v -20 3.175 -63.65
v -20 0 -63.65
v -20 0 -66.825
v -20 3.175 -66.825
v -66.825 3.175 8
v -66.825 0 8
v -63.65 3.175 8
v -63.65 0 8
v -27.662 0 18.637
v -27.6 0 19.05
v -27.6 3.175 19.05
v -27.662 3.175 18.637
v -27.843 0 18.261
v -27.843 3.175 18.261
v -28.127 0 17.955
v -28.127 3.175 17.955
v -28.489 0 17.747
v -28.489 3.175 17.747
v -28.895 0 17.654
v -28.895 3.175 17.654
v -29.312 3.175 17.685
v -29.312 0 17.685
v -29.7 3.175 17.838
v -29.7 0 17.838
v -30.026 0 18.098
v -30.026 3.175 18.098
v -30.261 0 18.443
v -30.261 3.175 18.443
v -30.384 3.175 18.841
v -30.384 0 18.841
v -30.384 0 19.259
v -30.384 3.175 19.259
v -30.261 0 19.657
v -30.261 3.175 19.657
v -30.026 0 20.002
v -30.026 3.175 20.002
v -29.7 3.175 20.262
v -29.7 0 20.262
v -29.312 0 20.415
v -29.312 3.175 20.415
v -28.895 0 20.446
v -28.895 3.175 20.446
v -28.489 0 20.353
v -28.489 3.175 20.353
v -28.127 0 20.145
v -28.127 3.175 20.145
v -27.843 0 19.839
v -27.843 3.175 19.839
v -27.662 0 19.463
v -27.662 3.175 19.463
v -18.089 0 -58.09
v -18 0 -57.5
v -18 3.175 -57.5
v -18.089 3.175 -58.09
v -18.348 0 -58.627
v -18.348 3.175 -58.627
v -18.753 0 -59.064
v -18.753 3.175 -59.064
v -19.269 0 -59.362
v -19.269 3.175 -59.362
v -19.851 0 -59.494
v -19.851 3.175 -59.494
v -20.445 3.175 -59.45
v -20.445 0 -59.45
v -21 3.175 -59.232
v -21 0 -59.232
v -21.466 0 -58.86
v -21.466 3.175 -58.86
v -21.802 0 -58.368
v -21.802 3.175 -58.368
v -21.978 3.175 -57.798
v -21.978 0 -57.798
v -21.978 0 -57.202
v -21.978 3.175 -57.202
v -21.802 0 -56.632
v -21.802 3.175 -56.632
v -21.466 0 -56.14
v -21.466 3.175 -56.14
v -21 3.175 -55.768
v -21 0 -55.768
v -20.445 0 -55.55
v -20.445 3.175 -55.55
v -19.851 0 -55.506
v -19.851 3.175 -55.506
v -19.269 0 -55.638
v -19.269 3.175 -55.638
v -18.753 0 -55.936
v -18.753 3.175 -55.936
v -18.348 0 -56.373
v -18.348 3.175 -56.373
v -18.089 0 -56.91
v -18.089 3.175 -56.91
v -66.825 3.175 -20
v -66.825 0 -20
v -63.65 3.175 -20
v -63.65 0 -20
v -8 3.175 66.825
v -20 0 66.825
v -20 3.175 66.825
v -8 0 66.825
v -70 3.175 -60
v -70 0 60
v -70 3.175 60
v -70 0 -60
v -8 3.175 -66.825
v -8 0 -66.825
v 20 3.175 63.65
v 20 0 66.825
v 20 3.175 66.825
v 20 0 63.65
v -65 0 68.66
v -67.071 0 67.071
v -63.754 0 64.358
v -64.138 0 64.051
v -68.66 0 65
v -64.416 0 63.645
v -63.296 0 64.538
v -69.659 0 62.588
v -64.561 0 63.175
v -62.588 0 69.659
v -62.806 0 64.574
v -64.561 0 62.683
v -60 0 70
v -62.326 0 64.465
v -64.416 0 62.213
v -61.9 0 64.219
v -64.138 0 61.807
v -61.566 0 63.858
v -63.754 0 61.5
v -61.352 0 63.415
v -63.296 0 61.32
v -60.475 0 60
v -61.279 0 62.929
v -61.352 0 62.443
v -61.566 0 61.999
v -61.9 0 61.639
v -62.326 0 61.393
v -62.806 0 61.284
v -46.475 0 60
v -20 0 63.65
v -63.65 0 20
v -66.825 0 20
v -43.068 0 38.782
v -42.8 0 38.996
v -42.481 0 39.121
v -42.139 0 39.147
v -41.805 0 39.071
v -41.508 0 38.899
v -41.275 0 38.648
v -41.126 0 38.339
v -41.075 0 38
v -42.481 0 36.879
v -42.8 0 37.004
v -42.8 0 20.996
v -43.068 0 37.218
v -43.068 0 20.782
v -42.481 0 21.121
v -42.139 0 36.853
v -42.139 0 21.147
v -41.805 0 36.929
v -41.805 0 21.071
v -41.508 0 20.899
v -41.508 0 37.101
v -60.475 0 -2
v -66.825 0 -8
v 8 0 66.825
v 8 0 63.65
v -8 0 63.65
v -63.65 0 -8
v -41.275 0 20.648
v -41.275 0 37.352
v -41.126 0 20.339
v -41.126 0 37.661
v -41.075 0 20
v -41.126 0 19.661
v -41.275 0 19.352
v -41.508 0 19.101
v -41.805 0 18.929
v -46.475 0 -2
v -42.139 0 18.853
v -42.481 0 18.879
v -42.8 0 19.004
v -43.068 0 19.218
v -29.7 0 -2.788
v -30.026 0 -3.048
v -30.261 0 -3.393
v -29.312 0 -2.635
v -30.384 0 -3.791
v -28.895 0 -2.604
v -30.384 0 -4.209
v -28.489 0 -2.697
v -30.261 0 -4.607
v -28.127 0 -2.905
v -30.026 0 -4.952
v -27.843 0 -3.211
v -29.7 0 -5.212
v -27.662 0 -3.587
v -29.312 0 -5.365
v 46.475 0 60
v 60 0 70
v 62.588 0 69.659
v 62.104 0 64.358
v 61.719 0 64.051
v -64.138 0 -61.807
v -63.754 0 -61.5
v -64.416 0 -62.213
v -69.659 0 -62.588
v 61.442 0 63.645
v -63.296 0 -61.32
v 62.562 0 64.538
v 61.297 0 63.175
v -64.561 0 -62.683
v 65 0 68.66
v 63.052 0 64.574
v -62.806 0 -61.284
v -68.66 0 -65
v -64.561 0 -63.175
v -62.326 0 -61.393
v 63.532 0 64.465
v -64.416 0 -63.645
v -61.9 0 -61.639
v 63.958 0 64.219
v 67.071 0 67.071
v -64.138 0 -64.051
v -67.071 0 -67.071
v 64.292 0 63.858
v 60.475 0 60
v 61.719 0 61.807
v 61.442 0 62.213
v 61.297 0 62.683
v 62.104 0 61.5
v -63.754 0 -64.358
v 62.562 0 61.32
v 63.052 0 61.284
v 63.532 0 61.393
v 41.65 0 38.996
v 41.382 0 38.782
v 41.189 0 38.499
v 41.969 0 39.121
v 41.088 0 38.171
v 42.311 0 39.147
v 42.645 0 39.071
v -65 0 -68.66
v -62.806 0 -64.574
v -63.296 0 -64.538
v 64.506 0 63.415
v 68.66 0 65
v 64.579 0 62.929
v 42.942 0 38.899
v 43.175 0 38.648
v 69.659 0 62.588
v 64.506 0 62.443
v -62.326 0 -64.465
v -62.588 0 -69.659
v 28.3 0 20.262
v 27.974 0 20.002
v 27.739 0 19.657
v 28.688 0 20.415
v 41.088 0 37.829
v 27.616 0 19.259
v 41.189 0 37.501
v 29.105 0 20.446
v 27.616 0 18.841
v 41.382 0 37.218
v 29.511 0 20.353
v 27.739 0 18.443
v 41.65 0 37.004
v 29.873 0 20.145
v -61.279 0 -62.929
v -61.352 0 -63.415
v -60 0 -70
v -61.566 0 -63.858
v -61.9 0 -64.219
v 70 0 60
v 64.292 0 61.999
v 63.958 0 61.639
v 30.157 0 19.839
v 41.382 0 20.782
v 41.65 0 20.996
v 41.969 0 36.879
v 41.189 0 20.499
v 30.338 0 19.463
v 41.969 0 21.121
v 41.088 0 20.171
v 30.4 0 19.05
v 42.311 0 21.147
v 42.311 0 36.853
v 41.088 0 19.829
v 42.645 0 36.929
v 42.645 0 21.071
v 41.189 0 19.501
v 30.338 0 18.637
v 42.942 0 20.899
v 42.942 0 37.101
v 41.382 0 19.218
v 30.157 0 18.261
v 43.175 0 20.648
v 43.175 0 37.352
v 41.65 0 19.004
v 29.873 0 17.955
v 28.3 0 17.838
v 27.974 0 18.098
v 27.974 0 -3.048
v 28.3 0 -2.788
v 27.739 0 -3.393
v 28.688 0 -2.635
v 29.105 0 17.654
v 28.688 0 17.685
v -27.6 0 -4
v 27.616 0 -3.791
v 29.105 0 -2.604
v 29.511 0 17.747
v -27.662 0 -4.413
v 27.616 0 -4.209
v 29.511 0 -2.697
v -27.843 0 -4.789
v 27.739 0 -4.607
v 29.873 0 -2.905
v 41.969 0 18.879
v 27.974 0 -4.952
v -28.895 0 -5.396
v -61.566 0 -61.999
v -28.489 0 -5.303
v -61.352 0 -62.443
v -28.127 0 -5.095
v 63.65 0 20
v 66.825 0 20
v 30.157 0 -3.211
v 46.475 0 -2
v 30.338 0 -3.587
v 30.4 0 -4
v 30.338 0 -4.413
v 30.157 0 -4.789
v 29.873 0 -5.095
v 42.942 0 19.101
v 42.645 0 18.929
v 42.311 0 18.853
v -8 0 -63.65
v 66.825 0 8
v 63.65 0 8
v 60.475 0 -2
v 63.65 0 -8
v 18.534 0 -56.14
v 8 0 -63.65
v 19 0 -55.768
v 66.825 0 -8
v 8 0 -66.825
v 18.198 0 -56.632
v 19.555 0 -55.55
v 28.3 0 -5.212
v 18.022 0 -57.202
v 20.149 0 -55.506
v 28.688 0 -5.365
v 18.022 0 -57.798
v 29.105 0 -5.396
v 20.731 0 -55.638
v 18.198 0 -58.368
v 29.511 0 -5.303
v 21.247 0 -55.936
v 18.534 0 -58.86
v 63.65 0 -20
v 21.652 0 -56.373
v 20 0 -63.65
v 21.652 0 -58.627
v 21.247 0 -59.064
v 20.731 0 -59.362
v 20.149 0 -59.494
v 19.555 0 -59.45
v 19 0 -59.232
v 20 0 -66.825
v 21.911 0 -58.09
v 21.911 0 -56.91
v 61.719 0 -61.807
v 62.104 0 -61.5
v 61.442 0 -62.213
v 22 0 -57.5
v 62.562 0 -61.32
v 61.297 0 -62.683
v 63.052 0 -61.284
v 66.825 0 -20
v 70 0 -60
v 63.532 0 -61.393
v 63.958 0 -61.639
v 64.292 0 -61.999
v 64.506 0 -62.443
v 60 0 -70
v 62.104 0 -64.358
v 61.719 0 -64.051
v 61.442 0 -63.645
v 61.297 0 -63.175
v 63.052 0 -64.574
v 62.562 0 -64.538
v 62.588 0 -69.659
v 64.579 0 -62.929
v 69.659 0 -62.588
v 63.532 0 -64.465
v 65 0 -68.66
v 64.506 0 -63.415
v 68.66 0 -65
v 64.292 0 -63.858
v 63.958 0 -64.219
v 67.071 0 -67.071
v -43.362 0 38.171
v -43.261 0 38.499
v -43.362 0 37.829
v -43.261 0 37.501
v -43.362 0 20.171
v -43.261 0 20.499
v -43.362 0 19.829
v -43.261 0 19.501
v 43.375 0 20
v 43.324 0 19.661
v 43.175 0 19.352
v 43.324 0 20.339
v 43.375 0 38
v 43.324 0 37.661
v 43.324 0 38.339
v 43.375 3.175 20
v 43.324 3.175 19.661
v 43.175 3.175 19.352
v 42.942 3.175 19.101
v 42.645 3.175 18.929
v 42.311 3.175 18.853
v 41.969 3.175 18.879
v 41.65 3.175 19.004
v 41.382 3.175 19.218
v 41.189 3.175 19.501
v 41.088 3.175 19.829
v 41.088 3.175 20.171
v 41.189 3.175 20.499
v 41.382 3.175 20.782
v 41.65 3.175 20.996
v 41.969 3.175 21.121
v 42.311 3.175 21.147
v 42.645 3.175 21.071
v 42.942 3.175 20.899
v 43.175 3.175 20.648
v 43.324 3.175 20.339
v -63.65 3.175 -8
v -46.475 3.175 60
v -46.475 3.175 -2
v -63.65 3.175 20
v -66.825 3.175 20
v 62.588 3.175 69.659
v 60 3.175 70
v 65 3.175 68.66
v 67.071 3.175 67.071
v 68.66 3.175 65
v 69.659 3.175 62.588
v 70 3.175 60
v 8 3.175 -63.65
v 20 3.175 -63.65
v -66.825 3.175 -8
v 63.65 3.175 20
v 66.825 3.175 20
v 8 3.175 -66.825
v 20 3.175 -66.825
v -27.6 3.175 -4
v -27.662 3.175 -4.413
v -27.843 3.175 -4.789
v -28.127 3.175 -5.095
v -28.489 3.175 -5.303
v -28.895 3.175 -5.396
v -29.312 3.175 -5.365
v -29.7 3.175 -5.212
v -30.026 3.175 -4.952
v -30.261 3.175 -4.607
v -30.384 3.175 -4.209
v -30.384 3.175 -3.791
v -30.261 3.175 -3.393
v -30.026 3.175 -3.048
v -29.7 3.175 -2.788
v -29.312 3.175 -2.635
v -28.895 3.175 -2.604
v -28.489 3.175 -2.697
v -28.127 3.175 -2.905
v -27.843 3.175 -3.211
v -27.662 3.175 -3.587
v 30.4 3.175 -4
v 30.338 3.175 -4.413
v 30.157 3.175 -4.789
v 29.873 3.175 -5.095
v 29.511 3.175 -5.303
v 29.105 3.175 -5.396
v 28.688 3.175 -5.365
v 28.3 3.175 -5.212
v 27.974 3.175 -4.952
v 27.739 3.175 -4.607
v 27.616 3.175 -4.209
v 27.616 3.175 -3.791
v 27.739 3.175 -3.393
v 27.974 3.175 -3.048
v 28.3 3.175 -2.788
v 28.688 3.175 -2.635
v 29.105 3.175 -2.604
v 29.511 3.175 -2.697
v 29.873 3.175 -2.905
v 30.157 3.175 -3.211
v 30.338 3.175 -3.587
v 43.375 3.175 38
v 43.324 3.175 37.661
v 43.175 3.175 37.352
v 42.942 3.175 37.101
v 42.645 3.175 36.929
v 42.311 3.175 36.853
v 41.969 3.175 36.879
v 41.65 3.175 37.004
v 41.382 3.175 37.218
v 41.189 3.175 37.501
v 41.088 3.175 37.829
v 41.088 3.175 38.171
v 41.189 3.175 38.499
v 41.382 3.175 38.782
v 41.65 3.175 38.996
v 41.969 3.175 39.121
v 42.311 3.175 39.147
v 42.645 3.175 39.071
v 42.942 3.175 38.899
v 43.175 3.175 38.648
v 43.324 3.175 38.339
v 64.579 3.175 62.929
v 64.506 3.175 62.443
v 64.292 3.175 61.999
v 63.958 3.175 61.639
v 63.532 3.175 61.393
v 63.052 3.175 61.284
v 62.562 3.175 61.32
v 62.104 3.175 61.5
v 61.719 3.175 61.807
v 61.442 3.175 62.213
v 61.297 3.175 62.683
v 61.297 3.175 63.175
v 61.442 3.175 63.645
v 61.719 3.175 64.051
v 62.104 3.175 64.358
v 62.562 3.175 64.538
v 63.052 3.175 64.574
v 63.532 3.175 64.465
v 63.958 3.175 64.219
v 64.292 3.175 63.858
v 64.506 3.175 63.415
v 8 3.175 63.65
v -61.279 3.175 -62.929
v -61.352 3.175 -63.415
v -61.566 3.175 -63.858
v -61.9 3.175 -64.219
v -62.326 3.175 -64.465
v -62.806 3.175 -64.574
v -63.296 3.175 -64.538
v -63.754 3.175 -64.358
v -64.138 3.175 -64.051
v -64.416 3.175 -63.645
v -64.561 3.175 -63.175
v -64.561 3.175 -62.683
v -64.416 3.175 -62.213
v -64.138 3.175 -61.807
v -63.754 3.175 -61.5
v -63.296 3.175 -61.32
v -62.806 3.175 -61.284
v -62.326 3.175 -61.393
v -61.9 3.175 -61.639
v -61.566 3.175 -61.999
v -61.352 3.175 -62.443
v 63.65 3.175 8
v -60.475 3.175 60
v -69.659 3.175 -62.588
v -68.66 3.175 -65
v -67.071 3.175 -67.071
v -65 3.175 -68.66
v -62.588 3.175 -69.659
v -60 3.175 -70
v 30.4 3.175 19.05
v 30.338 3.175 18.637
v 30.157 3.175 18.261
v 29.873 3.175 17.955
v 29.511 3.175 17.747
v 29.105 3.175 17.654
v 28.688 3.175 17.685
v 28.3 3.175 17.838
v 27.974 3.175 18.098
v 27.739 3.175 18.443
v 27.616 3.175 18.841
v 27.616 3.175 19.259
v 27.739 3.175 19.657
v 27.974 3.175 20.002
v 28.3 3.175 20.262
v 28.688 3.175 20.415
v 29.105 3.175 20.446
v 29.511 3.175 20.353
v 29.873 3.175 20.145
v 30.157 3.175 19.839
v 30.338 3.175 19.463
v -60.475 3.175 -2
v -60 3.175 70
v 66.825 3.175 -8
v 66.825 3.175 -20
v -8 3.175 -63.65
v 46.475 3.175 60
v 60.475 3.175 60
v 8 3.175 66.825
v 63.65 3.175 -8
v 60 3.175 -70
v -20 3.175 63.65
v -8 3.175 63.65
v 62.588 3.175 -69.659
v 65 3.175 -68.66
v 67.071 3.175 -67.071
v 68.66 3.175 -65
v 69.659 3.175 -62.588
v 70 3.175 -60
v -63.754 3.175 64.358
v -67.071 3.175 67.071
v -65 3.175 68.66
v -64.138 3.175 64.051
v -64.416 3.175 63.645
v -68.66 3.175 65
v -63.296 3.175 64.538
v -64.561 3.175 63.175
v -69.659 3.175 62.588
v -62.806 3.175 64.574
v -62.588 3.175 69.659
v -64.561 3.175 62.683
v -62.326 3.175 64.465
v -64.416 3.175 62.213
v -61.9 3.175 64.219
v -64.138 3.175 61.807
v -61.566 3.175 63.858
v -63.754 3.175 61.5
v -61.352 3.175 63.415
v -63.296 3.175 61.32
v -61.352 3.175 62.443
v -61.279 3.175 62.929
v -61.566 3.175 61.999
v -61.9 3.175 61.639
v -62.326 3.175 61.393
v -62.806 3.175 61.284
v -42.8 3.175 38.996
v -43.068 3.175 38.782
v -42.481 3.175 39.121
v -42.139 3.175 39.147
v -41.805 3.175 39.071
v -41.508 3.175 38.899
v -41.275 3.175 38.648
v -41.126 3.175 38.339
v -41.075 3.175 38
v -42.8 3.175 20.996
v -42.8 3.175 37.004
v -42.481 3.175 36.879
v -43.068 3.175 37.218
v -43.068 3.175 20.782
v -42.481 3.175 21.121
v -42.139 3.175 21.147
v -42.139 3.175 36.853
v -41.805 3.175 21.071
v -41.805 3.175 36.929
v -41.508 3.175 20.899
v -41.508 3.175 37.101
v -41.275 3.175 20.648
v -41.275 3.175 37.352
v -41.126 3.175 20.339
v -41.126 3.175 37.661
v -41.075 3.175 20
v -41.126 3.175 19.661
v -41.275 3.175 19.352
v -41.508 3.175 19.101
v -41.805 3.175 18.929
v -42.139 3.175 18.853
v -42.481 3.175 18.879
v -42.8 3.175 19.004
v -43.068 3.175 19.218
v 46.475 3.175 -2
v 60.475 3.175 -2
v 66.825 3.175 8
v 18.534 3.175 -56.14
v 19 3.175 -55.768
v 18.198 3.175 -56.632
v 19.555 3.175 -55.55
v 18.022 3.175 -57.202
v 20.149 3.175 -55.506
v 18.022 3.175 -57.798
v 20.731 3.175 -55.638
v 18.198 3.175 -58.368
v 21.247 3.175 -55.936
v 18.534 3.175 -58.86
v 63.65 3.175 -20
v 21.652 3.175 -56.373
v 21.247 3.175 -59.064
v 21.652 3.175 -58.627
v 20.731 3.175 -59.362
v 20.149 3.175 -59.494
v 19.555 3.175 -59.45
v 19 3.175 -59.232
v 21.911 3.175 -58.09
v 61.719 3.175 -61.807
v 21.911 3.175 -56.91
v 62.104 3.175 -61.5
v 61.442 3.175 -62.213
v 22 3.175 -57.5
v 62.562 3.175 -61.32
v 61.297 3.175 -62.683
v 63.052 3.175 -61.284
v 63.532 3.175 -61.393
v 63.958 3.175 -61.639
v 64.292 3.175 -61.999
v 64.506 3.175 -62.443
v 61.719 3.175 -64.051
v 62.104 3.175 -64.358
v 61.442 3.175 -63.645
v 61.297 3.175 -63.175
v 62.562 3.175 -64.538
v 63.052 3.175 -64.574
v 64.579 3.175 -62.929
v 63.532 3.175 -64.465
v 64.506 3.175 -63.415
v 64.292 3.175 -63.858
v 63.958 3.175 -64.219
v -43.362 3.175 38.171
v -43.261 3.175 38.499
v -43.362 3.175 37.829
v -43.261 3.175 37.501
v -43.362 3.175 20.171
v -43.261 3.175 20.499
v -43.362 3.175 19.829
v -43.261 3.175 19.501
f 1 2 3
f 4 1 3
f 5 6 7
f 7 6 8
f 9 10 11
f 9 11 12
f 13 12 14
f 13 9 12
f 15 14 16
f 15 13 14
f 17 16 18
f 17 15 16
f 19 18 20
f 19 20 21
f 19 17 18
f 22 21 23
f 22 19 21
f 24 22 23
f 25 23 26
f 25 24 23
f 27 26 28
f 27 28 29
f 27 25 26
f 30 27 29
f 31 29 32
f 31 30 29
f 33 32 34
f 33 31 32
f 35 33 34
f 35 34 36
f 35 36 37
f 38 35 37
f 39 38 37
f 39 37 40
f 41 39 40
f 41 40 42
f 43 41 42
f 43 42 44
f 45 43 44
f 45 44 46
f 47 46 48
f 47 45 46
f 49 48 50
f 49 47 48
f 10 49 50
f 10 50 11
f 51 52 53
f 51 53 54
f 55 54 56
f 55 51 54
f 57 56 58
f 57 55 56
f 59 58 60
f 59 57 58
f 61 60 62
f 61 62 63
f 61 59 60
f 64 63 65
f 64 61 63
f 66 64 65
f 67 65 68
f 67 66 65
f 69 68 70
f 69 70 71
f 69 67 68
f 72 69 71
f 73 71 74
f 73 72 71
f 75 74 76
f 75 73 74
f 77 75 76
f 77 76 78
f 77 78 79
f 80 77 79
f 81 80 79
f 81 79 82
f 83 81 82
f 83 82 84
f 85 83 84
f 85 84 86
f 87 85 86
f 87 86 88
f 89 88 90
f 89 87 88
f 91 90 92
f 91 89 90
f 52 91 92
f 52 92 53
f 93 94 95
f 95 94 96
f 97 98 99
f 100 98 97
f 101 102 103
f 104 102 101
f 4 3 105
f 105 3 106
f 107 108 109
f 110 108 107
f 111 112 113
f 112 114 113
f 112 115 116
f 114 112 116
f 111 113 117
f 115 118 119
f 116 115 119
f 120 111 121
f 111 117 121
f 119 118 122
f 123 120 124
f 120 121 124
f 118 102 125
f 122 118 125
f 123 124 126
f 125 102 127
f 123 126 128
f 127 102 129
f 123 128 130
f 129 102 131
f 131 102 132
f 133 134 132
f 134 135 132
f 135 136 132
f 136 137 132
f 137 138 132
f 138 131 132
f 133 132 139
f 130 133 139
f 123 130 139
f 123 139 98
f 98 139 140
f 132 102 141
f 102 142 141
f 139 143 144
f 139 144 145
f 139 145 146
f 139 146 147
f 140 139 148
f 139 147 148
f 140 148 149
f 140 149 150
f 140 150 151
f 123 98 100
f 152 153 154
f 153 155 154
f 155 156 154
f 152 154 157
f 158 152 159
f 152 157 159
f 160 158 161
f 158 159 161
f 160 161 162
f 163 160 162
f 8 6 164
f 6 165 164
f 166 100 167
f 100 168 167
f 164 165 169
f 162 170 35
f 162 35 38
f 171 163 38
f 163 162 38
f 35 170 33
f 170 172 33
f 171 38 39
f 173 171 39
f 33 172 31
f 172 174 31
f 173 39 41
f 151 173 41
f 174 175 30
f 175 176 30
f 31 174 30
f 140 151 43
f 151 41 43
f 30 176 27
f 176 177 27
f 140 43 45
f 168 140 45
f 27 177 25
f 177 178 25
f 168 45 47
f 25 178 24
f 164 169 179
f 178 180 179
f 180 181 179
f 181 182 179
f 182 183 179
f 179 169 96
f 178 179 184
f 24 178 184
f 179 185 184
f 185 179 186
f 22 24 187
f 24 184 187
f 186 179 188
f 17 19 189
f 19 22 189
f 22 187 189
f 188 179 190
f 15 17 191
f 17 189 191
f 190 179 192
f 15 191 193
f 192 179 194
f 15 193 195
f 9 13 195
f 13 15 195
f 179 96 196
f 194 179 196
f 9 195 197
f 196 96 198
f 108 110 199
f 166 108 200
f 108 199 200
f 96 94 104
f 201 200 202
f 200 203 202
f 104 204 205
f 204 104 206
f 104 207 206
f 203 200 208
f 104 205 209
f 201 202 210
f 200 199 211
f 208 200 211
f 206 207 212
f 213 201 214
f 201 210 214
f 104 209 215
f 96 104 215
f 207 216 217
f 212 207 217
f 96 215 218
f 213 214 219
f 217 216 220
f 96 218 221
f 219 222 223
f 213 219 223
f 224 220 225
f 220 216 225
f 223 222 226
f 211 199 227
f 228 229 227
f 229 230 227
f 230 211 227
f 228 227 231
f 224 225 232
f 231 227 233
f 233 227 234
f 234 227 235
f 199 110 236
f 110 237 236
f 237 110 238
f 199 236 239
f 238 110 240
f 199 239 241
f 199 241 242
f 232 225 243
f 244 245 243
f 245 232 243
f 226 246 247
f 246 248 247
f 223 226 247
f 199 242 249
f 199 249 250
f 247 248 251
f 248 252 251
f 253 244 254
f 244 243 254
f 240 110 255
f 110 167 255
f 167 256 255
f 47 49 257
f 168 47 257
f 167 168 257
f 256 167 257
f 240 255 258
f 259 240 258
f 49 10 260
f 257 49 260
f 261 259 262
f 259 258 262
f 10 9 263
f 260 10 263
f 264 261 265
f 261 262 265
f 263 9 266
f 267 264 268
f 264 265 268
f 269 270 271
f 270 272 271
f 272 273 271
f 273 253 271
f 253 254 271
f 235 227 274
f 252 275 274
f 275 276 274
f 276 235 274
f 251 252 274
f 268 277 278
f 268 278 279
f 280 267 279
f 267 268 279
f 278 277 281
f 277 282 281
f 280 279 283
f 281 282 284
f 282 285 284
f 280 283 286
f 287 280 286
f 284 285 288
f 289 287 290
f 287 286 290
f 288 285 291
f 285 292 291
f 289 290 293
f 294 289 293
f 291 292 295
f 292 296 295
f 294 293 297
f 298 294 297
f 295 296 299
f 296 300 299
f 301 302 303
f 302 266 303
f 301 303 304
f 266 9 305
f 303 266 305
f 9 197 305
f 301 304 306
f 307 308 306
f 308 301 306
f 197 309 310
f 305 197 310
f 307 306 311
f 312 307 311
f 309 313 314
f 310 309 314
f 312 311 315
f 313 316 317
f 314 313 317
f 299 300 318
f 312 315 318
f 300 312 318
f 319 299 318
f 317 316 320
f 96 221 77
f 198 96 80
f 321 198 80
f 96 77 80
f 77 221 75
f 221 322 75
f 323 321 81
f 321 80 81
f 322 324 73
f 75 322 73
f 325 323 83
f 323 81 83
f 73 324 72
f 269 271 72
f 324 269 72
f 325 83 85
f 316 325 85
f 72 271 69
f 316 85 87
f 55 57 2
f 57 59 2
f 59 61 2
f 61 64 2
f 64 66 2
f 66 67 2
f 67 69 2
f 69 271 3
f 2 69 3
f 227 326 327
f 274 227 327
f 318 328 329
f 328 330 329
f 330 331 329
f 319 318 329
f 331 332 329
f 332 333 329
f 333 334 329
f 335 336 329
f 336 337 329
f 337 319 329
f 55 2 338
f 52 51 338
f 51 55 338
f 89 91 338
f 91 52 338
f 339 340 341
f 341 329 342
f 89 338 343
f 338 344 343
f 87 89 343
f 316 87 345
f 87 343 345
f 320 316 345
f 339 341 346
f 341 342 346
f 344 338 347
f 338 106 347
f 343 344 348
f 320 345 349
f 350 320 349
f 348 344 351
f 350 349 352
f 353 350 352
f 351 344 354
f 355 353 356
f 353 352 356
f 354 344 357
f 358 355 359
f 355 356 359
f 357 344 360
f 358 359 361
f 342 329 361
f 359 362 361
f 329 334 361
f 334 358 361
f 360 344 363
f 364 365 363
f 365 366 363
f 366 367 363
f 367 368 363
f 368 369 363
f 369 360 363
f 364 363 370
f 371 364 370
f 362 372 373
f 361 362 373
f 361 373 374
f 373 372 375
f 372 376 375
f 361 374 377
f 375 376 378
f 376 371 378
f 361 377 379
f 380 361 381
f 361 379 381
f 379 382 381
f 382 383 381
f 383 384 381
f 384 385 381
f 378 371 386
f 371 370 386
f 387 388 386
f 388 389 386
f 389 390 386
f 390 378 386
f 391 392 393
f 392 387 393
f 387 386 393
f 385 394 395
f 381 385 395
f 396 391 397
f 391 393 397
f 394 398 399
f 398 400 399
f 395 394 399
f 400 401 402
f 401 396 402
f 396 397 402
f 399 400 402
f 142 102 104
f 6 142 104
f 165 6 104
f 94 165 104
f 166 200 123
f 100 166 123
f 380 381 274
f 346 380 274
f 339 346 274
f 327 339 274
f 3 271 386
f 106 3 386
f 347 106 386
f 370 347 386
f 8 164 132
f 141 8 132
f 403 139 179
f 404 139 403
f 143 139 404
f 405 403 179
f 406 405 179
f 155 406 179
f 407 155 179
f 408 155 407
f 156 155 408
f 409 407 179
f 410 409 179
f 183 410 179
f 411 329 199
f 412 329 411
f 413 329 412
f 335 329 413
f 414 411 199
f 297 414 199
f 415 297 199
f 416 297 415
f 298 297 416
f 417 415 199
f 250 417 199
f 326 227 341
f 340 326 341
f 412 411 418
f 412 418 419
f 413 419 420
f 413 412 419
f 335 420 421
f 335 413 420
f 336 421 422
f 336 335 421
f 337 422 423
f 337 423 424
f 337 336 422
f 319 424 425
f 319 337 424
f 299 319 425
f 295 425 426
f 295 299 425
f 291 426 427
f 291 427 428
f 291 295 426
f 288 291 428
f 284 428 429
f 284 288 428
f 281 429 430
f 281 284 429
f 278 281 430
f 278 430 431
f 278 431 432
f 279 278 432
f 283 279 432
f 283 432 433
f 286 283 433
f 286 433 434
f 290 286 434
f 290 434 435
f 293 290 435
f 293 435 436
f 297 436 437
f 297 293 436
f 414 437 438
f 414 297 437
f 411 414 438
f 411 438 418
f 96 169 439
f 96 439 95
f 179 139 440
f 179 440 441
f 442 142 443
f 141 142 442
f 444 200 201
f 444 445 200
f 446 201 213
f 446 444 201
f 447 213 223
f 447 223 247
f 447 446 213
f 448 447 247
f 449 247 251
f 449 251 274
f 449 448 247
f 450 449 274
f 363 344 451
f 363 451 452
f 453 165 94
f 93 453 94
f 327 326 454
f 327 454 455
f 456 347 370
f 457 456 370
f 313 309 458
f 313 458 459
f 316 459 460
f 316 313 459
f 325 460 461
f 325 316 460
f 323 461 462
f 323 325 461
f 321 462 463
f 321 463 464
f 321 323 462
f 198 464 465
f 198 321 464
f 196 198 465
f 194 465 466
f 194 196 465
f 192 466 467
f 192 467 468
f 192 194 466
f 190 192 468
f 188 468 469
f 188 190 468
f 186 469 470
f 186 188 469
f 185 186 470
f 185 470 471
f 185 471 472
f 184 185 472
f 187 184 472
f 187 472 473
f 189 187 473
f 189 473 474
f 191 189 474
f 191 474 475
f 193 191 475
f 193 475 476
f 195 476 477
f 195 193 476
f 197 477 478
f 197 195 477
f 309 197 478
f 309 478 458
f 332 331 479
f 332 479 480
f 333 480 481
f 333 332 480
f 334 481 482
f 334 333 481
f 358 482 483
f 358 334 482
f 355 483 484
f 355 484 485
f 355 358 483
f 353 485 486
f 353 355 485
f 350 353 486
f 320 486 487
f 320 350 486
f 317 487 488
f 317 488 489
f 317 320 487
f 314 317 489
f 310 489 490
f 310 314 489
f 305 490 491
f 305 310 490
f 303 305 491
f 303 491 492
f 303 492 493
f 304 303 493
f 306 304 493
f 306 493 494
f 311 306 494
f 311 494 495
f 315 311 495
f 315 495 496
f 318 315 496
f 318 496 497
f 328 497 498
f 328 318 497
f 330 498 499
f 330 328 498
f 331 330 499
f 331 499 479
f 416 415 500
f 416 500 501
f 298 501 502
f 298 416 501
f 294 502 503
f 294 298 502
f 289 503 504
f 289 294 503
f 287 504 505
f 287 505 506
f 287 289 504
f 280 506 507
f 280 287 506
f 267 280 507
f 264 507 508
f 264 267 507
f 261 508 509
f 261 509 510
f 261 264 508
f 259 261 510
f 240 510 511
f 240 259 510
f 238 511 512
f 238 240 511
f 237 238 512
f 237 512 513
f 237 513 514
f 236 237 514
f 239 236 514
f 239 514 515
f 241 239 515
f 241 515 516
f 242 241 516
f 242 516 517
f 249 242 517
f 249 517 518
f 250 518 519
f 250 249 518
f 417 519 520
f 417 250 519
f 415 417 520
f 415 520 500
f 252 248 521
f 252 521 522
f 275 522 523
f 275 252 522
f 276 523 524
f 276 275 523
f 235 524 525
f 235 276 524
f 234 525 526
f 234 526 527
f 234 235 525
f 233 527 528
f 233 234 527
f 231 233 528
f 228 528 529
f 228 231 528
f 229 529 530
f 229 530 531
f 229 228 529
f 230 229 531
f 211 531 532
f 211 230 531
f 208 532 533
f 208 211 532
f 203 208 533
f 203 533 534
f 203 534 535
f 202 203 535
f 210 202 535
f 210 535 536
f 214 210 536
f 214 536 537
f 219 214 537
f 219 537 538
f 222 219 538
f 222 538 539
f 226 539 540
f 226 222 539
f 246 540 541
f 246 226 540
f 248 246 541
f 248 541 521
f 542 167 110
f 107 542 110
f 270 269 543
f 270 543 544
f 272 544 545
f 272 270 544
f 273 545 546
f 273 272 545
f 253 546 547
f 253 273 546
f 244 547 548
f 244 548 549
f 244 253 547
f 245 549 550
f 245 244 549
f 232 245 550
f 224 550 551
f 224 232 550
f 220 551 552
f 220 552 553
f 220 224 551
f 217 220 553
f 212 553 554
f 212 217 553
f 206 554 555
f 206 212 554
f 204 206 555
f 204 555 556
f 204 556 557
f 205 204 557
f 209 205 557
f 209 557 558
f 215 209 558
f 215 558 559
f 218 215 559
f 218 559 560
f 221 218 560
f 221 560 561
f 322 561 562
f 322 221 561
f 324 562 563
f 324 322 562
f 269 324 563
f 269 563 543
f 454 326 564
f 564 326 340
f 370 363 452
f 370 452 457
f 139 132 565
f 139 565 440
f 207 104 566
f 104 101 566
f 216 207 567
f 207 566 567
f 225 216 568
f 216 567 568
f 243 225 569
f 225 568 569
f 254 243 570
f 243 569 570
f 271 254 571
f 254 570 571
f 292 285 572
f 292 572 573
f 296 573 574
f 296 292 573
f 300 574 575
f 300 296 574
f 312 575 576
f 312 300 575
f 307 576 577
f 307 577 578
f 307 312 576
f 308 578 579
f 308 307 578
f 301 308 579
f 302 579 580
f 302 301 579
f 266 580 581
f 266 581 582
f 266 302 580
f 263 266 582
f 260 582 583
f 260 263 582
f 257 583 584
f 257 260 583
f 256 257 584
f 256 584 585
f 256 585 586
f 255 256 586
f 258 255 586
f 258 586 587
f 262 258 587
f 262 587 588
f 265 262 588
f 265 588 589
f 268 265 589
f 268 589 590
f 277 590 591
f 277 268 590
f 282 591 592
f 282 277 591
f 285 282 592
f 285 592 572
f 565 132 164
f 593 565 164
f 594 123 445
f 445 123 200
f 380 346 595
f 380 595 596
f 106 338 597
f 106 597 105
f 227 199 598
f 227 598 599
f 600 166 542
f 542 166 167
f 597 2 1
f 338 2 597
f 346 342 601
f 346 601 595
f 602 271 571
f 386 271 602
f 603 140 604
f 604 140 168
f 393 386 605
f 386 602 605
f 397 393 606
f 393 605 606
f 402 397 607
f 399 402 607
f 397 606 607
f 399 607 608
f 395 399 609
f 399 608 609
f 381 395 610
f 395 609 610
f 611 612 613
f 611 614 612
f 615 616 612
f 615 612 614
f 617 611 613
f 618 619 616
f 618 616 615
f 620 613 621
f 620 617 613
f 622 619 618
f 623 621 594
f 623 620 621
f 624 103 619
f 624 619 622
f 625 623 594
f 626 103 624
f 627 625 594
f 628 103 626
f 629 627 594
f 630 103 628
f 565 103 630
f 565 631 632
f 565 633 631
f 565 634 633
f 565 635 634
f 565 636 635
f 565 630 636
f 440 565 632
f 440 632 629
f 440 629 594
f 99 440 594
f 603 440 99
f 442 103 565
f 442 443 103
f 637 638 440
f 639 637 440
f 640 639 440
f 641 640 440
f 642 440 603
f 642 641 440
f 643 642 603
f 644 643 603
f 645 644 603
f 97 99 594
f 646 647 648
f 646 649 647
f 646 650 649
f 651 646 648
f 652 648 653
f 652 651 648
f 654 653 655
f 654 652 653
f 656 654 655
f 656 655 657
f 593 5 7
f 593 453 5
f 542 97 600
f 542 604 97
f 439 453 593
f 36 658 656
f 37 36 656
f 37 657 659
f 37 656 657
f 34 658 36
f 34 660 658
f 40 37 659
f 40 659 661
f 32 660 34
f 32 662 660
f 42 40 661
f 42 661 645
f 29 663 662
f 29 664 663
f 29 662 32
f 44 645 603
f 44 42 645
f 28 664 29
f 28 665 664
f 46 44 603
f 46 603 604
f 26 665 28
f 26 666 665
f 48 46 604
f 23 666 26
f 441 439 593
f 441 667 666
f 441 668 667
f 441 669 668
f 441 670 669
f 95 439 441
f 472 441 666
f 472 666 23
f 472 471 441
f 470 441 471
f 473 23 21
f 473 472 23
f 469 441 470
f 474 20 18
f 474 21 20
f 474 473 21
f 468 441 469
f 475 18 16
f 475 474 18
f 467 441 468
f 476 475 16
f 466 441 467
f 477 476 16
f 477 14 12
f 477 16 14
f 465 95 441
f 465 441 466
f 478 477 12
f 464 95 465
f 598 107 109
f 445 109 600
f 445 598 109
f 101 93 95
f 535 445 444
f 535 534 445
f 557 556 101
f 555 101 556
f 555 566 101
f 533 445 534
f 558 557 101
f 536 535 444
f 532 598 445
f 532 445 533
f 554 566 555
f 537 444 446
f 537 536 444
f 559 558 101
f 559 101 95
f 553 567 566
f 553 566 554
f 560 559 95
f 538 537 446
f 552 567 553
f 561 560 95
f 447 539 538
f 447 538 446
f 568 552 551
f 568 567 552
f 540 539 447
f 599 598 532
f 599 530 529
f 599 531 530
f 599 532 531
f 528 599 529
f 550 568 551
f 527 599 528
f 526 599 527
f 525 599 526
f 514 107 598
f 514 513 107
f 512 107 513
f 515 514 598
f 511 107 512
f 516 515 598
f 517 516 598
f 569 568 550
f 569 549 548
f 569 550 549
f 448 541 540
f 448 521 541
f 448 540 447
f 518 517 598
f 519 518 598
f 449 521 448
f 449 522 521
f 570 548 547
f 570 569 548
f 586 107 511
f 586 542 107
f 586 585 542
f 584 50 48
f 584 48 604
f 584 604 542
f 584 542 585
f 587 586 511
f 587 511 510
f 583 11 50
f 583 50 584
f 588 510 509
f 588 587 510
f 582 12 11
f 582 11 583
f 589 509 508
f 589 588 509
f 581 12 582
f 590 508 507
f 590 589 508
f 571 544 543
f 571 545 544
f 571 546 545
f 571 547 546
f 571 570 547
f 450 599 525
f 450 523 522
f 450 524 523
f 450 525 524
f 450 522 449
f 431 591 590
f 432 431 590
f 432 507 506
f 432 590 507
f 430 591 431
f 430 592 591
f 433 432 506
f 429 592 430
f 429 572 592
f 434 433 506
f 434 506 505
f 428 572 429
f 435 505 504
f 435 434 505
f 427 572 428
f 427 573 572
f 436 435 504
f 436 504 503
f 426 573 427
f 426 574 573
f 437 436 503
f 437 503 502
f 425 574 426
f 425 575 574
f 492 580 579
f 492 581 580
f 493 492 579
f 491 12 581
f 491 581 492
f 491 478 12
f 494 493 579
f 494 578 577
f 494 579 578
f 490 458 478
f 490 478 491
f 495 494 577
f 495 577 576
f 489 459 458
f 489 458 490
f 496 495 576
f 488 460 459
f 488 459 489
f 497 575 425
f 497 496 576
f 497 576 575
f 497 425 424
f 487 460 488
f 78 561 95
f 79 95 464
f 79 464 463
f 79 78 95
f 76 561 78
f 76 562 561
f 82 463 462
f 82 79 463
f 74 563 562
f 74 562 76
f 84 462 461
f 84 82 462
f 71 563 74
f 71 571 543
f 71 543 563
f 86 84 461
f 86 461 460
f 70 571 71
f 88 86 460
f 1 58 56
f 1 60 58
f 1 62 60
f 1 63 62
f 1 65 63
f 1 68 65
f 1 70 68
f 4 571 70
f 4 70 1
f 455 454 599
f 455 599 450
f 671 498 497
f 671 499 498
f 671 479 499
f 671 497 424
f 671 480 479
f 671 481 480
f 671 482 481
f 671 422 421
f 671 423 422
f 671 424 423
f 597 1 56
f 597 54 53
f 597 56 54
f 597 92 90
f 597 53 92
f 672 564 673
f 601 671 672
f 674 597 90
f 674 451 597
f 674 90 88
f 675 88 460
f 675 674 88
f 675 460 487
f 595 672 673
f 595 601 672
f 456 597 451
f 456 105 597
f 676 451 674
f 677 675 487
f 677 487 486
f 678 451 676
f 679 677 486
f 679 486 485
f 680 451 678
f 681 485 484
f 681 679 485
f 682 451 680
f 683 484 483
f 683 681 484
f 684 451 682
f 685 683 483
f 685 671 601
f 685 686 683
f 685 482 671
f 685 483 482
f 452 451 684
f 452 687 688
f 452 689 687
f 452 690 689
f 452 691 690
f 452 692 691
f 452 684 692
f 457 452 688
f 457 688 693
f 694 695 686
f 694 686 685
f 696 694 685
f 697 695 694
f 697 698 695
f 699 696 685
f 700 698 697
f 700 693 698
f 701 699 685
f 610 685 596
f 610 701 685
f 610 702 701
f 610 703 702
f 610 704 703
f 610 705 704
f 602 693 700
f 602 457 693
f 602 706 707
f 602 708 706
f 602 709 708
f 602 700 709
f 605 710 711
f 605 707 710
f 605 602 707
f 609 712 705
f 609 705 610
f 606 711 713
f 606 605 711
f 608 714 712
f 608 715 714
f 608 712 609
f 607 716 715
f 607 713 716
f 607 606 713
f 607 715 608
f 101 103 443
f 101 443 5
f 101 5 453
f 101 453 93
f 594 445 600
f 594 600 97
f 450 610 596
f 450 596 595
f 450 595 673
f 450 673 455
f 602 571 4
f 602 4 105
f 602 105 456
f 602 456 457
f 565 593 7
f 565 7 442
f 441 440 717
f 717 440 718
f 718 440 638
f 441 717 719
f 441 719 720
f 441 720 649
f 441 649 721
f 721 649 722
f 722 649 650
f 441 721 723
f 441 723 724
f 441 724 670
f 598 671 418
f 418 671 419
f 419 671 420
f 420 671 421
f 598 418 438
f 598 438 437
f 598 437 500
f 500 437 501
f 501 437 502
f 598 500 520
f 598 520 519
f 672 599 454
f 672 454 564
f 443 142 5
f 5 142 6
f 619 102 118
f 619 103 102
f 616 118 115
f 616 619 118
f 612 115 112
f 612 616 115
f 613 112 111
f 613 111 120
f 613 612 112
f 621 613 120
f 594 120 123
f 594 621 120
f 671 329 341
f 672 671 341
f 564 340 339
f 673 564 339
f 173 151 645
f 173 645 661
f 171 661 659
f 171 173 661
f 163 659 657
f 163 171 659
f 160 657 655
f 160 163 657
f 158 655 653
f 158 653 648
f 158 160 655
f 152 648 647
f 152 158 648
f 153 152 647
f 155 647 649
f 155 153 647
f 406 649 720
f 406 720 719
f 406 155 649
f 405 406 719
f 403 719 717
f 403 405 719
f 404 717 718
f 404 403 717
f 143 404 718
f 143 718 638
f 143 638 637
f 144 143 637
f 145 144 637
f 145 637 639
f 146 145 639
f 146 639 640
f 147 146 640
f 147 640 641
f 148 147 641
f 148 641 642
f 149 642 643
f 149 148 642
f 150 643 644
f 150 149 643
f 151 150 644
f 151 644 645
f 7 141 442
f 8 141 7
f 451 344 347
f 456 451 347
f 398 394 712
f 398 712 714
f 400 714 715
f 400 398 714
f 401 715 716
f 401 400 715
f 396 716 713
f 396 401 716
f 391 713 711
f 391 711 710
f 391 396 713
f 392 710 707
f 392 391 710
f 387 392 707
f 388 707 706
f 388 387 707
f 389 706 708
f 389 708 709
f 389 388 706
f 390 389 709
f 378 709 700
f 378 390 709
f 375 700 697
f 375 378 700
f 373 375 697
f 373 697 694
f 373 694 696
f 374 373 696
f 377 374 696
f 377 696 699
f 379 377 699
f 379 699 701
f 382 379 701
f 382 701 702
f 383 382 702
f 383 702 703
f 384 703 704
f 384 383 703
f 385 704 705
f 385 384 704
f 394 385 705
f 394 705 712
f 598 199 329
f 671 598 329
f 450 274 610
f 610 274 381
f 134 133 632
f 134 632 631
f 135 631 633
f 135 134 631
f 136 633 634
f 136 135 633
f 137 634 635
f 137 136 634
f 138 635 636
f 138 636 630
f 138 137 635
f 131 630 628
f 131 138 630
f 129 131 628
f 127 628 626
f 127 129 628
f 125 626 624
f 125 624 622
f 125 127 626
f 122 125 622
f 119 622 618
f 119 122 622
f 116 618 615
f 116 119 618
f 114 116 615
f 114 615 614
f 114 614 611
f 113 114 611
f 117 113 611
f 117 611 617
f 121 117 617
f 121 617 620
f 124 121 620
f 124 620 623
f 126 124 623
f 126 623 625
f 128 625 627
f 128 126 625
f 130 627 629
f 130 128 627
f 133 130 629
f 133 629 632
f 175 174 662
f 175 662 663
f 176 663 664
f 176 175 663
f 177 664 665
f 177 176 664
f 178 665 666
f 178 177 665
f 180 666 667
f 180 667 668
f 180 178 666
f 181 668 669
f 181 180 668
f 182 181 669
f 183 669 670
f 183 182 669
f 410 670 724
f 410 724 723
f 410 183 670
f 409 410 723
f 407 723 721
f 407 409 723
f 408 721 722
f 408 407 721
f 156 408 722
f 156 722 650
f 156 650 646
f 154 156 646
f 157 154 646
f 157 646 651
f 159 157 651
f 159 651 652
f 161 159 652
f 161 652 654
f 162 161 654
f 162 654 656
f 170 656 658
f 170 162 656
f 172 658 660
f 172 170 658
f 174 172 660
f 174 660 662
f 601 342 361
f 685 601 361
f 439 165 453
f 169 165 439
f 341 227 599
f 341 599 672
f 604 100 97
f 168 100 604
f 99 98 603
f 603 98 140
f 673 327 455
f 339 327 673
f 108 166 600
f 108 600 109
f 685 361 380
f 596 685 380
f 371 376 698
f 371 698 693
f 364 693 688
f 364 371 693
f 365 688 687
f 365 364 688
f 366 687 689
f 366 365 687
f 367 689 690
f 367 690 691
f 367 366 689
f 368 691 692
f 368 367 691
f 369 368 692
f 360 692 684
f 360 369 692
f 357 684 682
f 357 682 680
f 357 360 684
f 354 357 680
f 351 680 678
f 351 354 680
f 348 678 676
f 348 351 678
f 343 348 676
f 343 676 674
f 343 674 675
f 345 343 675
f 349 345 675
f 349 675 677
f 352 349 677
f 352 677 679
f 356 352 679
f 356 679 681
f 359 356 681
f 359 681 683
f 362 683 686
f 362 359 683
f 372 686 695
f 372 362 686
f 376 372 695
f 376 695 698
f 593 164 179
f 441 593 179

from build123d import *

# Parameters (mm, degrees)
SKETCH1_W           = 140
SKETCH1_H           = 140
SKETCH1_R           = 1.4
SKETCH1_R_2         = 1.15
SKETCH1_R_3         = 2
SKETCH1_R_4         = 1.65
SKETCH1_W_2         = 14
SKETCH1_H_2         = 62
SKETCH1_W_3         = 3.175
SKETCH1_H_3         = 12
SKETCH1_W_4         = 12
SKETCH1_H_4         = 3.175
BOSS_EXTRUDE1_DEPTH = 3.175
FILLET1_R           = 10


with BuildPart() as part:
    # Sketch1 → Boss-Extrude1 (new body)
    with BuildSketch(Plane(origin=(0, 0, 0), x_dir=(1, 0, 0), z_dir=(0, 1, 0))):
        Rectangle(SKETCH1_W, SKETCH1_H)
        with Locations((29, 4)):
            Circle(SKETCH1_R, mode=Mode.SUBTRACT)
        with Locations((29, -19.05)):
            Circle(SKETCH1_R, mode=Mode.SUBTRACT)
        with Locations((-29, -19.05)):
            Circle(SKETCH1_R, mode=Mode.SUBTRACT)
        with Locations((-29, 4)):
            Circle(SKETCH1_R, mode=Mode.SUBTRACT)
        with Locations((42.225, -20)):
            Circle(SKETCH1_R_2, mode=Mode.SUBTRACT)
        with Locations((42.225, -38)):
            Circle(SKETCH1_R_2, mode=Mode.SUBTRACT)
        with Locations((-42.225, -38)):
            Circle(SKETCH1_R_2, mode=Mode.SUBTRACT)
        with Locations((-42.225, -20)):
            Circle(SKETCH1_R_2, mode=Mode.SUBTRACT)
        with Locations((20, 57.5)):
            Circle(SKETCH1_R_3, mode=Mode.SUBTRACT)
        with Locations((-20, 57.5)):
            Circle(SKETCH1_R_3, mode=Mode.SUBTRACT)
        with Locations((62.928932188, -62.928932188)):
            Circle(SKETCH1_R_4, mode=Mode.SUBTRACT)
        with Locations((62.928932188, 62.928932188)):
            Circle(SKETCH1_R_4, mode=Mode.SUBTRACT)
        with Locations((-62.928932188, -62.928932188)):
            Circle(SKETCH1_R_4, mode=Mode.SUBTRACT)
        with Locations((-62.928932188, 62.928932188)):
            Circle(SKETCH1_R_4, mode=Mode.SUBTRACT)
        with Locations((-53.475, -29)):
            Rectangle(SKETCH1_W_2, SKETCH1_H_2, mode=Mode.SUBTRACT)
        with Locations((53.475, -29)):
            Rectangle(SKETCH1_W_2, SKETCH1_H_2, mode=Mode.SUBTRACT)
        with Locations((-65.2375, -14)):
            Rectangle(SKETCH1_W_3, SKETCH1_H_3, mode=Mode.SUBTRACT)
        with Locations((65.2375, -14)):
            Rectangle(SKETCH1_W_3, SKETCH1_H_3, mode=Mode.SUBTRACT)
        with Locations((14, -65.2375)):
            Rectangle(SKETCH1_W_4, SKETCH1_H_4, mode=Mode.SUBTRACT)
        with Locations((-14, -65.2375)):
            Rectangle(SKETCH1_W_4, SKETCH1_H_4, mode=Mode.SUBTRACT)
        with Locations((65.2375, 14)):
            Rectangle(SKETCH1_W_3, SKETCH1_H_3, mode=Mode.SUBTRACT)
        with Locations((14, 65.2375)):
            Rectangle(SKETCH1_W_4, SKETCH1_H_4, mode=Mode.SUBTRACT)
        with Locations((-14, 65.2375)):
            Rectangle(SKETCH1_W_4, SKETCH1_H_4, mode=Mode.SUBTRACT)
        with Locations((-65.2375, 14)):
            Rectangle(SKETCH1_W_3, SKETCH1_H_3, mode=Mode.SUBTRACT)
    extrude(amount=BOSS_EXTRUDE1_DEPTH)

    # Fillet1
    fillet1_edges = [part.edges().sort_by_distance(p)[0] for p in [
        (70, 1.5875, 70),
        (-70, 1.5875, 70),
        (-70, 1.5875, -70),
        (70, 1.5875, -70),
    ]]
    fillet(fillet1_edges, radius=FILLET1_R)


solid = part.part
